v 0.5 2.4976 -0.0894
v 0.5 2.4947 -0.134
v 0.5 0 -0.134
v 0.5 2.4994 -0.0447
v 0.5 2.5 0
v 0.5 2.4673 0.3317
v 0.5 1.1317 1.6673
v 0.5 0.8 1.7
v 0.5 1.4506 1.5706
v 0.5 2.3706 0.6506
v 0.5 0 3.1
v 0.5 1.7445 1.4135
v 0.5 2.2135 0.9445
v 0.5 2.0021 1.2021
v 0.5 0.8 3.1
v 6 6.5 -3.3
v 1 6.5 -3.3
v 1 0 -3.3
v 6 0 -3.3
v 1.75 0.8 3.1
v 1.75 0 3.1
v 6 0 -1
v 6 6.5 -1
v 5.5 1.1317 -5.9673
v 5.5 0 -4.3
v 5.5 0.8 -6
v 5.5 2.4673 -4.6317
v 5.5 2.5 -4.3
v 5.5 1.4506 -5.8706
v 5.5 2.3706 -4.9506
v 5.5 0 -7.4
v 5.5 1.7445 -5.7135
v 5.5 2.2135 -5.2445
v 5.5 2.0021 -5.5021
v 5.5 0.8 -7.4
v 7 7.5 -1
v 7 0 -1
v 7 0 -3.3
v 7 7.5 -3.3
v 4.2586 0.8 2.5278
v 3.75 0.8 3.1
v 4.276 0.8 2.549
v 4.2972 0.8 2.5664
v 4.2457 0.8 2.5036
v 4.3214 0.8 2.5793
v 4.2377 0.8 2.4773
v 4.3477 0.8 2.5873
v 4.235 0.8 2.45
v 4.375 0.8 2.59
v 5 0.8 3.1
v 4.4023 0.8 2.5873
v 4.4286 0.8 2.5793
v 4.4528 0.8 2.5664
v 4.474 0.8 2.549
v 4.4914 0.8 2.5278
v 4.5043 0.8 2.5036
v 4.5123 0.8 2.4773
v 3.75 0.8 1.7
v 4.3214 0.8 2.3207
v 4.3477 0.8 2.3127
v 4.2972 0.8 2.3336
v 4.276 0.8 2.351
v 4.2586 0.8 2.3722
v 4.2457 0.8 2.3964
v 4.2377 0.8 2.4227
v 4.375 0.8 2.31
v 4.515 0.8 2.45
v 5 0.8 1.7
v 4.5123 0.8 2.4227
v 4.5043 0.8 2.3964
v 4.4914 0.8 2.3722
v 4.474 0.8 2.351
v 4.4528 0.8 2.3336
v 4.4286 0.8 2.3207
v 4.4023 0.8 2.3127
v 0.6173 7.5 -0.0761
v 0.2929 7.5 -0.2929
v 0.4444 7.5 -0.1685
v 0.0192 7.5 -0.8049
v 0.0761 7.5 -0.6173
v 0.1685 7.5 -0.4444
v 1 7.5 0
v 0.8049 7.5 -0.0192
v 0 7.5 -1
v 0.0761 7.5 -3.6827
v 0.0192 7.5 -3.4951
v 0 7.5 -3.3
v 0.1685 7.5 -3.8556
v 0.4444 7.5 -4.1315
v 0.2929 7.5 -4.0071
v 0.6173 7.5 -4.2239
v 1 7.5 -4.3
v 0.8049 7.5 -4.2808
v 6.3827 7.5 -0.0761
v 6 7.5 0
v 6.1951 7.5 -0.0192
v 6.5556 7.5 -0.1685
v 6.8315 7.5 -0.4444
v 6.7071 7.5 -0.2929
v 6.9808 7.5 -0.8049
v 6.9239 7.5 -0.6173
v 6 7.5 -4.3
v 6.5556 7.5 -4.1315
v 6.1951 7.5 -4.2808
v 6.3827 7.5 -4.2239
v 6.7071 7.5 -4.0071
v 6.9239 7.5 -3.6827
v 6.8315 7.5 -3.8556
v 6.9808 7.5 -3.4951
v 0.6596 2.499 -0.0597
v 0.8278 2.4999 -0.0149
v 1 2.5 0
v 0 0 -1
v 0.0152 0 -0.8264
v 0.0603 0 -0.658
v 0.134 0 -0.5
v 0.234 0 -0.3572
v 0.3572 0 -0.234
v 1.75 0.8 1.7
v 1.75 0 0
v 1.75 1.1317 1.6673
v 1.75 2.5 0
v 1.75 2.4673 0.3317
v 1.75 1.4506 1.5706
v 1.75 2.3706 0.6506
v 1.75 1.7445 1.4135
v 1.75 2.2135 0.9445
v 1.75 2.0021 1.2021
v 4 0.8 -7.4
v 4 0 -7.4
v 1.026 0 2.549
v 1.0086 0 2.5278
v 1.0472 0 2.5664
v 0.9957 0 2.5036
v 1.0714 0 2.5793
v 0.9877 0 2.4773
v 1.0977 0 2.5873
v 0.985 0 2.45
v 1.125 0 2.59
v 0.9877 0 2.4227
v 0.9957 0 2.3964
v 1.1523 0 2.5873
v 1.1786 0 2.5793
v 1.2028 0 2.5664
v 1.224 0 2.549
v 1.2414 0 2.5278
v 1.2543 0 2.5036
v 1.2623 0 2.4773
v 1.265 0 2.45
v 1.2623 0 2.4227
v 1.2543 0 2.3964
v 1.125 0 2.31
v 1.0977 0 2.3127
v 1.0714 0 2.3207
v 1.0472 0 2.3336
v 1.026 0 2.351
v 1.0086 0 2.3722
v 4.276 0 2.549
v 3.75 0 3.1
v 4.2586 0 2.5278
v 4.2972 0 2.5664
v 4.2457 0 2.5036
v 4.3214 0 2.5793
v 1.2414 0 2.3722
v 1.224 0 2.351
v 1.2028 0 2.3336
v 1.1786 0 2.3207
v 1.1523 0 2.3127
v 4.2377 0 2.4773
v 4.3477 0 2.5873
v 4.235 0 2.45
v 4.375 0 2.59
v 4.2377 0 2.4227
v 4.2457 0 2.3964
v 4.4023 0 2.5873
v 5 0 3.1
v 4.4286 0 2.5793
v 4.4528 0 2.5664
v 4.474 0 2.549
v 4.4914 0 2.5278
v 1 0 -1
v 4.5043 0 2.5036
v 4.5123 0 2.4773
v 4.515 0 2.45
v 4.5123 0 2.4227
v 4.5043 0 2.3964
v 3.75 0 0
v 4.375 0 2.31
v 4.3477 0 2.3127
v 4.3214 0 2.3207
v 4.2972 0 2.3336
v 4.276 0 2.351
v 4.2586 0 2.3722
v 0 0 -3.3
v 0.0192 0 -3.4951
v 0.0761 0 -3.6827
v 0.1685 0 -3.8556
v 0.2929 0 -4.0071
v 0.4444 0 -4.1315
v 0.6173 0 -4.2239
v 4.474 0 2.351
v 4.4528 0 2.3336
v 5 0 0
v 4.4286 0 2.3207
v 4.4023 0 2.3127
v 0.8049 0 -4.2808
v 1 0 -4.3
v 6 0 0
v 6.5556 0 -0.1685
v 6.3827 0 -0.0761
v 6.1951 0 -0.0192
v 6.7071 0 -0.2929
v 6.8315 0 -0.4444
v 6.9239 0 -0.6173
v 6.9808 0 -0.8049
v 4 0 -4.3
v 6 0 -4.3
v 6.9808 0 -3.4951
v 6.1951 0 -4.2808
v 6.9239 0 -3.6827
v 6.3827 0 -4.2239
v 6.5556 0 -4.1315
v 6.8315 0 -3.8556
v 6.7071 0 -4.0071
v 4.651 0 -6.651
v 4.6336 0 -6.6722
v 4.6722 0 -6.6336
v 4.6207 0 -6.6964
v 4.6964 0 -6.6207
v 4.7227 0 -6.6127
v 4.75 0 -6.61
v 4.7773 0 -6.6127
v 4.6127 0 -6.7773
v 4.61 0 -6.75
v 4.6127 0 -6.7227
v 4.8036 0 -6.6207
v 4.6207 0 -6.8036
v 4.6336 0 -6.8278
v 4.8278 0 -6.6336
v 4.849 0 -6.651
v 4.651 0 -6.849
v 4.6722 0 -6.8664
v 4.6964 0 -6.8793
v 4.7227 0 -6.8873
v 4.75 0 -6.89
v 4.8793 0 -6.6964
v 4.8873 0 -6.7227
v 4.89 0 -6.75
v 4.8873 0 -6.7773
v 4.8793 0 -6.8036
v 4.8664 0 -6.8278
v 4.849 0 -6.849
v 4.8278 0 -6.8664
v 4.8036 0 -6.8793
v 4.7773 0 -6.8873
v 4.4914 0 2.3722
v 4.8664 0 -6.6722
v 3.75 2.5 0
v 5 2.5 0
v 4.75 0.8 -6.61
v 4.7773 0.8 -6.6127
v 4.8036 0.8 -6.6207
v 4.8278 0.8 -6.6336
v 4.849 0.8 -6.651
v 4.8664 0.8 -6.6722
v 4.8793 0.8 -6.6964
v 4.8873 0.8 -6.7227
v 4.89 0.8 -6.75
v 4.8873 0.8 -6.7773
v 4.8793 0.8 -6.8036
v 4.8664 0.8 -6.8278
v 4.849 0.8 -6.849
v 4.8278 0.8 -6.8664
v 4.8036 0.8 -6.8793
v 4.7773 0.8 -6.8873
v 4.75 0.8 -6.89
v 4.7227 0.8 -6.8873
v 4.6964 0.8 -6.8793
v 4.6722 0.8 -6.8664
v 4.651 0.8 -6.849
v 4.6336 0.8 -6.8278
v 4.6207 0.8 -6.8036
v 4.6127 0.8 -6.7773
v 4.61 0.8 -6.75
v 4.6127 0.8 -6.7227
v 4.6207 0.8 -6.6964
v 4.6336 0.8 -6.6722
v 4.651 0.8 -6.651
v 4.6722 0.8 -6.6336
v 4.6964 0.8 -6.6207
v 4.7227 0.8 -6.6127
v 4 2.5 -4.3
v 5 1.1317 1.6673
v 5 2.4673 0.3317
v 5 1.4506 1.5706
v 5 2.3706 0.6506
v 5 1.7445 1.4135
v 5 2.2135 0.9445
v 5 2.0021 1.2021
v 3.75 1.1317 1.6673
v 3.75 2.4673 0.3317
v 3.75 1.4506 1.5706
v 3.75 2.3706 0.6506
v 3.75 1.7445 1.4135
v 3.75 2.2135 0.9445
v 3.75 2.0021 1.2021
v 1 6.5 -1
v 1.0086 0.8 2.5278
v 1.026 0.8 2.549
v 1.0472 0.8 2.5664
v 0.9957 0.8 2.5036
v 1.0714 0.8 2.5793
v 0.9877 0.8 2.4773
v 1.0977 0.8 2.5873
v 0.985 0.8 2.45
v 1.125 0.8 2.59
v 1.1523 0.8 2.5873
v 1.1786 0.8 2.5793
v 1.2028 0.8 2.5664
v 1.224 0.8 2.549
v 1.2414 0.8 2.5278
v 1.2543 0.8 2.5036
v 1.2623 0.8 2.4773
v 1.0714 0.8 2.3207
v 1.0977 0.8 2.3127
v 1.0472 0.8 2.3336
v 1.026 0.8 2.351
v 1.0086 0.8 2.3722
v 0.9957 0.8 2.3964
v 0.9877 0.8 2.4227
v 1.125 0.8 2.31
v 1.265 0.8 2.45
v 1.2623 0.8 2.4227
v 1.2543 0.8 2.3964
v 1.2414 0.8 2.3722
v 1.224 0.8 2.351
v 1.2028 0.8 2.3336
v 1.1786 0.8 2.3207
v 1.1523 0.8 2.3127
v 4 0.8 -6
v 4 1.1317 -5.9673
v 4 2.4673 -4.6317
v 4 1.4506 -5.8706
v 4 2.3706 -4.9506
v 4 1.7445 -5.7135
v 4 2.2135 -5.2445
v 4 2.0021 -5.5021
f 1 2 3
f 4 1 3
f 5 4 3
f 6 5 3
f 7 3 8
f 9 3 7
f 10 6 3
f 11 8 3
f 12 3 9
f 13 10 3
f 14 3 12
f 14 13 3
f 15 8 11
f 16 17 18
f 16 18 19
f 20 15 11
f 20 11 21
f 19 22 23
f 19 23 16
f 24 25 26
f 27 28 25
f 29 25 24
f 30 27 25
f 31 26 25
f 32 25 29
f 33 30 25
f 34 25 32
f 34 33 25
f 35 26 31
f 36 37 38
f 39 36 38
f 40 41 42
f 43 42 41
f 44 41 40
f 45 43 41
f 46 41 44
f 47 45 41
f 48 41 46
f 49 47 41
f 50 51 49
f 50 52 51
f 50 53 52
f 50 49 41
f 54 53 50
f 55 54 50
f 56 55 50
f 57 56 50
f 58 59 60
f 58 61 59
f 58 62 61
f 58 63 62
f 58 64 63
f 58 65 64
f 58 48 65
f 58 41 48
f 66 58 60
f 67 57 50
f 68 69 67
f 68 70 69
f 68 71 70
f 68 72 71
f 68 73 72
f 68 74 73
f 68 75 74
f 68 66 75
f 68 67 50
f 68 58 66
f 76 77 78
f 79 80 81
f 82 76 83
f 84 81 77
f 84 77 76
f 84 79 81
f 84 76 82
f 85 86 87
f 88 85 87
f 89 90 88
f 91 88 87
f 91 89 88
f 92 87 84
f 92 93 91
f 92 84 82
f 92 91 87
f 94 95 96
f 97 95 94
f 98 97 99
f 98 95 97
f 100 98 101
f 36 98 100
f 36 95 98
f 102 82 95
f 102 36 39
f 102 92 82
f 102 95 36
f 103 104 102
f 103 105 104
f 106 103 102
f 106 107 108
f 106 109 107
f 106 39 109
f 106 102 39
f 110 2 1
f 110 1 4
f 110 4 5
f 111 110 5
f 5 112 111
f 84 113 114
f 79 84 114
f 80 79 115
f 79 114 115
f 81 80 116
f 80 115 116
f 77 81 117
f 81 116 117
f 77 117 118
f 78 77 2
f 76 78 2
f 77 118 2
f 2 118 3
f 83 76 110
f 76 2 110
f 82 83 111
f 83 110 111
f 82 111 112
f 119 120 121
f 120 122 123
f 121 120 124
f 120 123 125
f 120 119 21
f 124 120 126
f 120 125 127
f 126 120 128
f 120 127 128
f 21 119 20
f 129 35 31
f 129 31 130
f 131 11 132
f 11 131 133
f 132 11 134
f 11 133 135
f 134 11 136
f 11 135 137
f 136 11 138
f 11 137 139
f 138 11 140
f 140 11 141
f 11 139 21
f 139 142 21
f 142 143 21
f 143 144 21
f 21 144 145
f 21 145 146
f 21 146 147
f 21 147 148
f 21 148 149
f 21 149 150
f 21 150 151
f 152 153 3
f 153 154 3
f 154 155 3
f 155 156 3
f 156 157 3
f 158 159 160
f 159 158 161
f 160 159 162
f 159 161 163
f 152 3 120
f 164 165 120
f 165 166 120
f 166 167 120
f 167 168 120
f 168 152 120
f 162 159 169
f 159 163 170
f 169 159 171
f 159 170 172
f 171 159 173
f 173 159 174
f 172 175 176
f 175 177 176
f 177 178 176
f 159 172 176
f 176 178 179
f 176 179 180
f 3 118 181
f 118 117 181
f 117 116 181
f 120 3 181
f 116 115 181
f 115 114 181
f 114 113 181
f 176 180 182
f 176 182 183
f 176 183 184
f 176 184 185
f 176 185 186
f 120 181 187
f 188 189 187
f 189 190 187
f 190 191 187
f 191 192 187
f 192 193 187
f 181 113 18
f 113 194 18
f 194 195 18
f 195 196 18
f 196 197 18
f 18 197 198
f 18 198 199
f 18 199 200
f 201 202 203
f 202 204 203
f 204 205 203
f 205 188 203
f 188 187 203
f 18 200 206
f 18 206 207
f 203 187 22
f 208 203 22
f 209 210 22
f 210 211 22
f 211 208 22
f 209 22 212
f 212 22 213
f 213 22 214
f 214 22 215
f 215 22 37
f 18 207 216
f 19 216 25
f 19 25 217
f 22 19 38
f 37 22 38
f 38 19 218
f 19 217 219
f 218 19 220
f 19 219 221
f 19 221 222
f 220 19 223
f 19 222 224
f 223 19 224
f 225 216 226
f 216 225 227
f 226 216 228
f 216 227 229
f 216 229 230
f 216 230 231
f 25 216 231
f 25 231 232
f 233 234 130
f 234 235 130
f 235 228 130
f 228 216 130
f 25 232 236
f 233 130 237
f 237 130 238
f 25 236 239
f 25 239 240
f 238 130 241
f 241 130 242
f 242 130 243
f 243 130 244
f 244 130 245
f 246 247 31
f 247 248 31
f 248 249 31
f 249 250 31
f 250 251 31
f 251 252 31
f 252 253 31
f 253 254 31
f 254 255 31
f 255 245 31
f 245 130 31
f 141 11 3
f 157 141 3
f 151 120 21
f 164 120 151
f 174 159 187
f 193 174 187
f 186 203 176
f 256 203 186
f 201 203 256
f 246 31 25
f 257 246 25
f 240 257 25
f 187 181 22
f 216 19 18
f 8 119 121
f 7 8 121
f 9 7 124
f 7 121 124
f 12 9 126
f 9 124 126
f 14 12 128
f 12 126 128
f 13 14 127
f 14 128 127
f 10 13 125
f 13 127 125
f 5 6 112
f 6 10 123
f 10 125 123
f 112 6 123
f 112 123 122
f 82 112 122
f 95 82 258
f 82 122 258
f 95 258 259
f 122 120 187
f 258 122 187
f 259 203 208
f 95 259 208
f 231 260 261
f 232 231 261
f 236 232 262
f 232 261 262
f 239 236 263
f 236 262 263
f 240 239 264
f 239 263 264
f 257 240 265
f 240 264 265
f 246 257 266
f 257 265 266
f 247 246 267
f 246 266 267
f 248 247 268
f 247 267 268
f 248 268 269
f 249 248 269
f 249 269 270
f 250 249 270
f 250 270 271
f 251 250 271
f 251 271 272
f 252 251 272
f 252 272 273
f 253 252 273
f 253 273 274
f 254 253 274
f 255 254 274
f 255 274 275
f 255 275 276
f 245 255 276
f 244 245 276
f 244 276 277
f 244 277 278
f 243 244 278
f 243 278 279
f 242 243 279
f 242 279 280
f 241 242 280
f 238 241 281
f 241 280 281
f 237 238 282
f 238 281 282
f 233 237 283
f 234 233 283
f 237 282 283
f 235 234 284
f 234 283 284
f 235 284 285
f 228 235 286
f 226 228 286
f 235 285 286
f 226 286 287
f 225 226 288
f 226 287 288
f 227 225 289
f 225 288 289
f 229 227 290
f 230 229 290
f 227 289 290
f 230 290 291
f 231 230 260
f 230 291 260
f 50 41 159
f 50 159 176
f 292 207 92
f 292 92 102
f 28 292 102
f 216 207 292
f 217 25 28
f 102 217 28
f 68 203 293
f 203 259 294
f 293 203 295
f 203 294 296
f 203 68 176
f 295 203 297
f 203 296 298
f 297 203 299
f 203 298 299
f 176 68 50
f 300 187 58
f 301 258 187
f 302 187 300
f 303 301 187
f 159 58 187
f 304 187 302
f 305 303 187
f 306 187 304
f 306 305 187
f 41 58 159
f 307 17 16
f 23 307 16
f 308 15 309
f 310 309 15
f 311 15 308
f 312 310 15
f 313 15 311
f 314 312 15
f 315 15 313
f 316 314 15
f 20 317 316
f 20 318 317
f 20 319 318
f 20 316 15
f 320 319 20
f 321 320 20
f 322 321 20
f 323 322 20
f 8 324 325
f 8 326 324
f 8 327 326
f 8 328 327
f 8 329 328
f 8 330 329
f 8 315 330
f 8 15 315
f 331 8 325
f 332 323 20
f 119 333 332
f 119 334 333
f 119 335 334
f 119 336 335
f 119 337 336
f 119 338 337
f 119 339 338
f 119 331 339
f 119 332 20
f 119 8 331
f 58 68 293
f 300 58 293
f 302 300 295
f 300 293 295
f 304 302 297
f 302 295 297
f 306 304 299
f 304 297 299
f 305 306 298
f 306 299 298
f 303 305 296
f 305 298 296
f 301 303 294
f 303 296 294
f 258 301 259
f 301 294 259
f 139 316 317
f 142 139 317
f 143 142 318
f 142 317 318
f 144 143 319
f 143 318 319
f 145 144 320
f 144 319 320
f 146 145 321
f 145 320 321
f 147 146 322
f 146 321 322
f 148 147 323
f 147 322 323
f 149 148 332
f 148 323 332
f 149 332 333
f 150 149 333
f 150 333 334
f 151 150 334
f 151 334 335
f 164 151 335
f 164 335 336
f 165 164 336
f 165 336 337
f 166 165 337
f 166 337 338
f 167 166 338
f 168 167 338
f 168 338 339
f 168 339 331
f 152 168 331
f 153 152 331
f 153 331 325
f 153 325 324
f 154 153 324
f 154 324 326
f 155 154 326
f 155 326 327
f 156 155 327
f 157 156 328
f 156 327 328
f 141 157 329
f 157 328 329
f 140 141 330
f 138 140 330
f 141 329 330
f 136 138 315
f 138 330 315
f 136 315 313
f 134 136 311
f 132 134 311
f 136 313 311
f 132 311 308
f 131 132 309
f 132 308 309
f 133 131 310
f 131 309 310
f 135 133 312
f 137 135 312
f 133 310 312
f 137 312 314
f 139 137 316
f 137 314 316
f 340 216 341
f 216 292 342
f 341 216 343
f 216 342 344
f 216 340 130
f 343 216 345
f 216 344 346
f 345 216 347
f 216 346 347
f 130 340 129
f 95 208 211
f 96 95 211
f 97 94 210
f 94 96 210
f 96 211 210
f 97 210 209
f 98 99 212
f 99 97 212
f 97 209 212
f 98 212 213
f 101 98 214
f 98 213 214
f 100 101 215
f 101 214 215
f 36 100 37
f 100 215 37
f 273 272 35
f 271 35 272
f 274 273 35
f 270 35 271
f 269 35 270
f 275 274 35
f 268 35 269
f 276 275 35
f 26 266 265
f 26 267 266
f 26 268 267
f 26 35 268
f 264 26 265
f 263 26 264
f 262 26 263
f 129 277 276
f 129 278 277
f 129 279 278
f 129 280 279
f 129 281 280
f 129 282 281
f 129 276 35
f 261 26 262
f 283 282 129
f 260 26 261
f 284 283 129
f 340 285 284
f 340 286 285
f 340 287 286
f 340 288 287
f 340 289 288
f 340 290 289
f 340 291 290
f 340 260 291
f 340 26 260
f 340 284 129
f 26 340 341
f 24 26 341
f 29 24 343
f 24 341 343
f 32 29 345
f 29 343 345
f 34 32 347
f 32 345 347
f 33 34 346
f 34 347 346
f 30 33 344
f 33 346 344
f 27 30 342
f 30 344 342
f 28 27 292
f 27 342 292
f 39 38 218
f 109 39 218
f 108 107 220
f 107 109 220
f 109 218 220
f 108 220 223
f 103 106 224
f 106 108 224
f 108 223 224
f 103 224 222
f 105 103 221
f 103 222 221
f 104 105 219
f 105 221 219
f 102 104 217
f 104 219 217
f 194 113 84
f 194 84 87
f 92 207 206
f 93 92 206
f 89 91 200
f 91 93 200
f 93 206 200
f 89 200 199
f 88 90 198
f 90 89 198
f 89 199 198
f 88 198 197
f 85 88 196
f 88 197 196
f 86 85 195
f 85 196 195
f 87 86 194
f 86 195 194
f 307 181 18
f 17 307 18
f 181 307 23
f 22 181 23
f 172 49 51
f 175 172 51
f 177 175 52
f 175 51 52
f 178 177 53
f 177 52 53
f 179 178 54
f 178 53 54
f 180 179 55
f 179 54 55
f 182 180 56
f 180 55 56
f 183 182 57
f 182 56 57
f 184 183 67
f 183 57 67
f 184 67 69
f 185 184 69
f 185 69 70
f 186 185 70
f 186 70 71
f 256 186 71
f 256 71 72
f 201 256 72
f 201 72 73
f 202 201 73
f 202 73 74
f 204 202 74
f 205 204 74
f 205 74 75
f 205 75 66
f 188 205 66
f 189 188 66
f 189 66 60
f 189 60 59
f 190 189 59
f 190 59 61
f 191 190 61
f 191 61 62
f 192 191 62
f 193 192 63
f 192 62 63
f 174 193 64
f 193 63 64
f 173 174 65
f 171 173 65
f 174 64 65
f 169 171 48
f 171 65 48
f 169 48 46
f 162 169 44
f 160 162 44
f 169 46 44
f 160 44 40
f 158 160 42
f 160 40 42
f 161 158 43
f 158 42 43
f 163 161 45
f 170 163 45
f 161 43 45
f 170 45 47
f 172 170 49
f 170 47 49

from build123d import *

# Parameters (mm, degrees)
ESQUISSE1_W             = 7
ESQUISSE1_H             = 4.3
BOSS_EXTRU_1_DEPTH      = 7.5
COQUE1_T                = -1
ESQUISSE2_W             = 1.25
ESQUISSE2_H             = 0.8
BOSS_EXTRU_2_DEPTH      = 3.1
ESQUISSE3_W             = 1.5
ESQUISSE3_H             = 0.8
BOSS_EXTRU_3_DEPTH      = 3.1
ESQUISSE4_R             = 0.14
ENL_V_MAT_EXTRU_1_DEPTH = 13.192210628
BOSS_EXTRU_4_DEPTH      = 1.25
BOSS_EXTRU_5_START      = -1.25
BOSS_EXTRU_5_DEPTH      = 1.25
BOSS_EXTRU_6_DEPTH      = 1.5
CONG_1_R                = 1


with BuildPart() as part:
    # Esquisse1 → Boss.-Extru.1 (new body)
    with BuildSketch(Plane(origin=(0, 0, 0), x_dir=(1, 0, 0), z_dir=(0, 1, 0))):
        with Locations((3.5, 2.15)):
            Rectangle(ESQUISSE1_W, ESQUISSE1_H)
    extrude(amount=BOSS_EXTRU_1_DEPTH)

    # Coque1
    coque1_openings = [part.faces().sort_by_distance(p)[0] for p in [
        (3.5, 0, -2.15),
    ]]
    offset(amount=COQUE1_T, openings=coque1_openings, kind=Kind.INTERSECTION)

    # Esquisse2 → Boss.-Extru.2 (add)
    with BuildSketch(Plane.XY):
        with Locations((1.125, 0.4)):
            Rectangle(ESQUISSE2_W, ESQUISSE2_H)
        with Locations((4.375, 0.4)):
            Rectangle(ESQUISSE2_W, ESQUISSE2_H)
    extrude(amount=BOSS_EXTRU_2_DEPTH)

    # Esquisse3 → Boss.-Extru.3 (add)
    with BuildSketch(Plane(origin=(0, 0, -4.3), x_dir=(-1, 0, 0), z_dir=(0, 0, -1))):
        with Locations((-4.75, 0.4)):
            Rectangle(ESQUISSE3_W, ESQUISSE3_H)
    extrude(amount=BOSS_EXTRU_3_DEPTH)

    # Esquisse4 → Enlèv. mat.-Extru.1 (cut, through all)
    with BuildSketch(Plane(origin=(0, 0.8, 0), x_dir=(1, 0, 0), z_dir=(0, 1, 0))):
        with Locations(Location((4.75, 6.75, 0), (0, 0, 270))):
            Circle(ESQUISSE4_R)
        with Locations(Location((1.125, -2.45, 0), (0, 0, 270))):
            Circle(ESQUISSE4_R)
        with Locations(Location((4.375, -2.45, 0), (0, 0, 270))):
            Circle(ESQUISSE4_R)
    extrude(amount=-ENL_V_MAT_EXTRU_1_DEPTH, mode=Mode.SUBTRACT)

    # Esquisse5 → Boss.-Extru.4 (add)
    with BuildSketch(Plane(origin=(5, 0, 0), x_dir=(0, 0, -1), z_dir=(1, 0, 0))):
        with BuildLine():
            Line((0, 2.5), (0, 0.8))
            Line((0, 0.8), (-1.7, 0.8))
            ThreePointArc((-1.7, 0.8), (-1.202081528, 2.002081528), (0, 2.5))
        make_face()
    extrude(amount=-BOSS_EXTRU_4_DEPTH)

    # Esquisse6 → Boss.-Extru.5 (add)
    with BuildSketch(Plane.ZY.offset(-0.5).offset(BOSS_EXTRU_5_START)):
        with BuildLine():
            Line((0, 2.5), (0, 0.8))
            Line((0, 0.8), (1.7, 0.8))
            ThreePointArc((1.7, 0.8), (1.202081528, 2.002081528), (0, 2.5))
        make_face()
    extrude(amount=BOSS_EXTRU_5_DEPTH)

    # Esquisse7 → Boss.-Extru.6 (add)
    with BuildSketch(Plane.ZY.offset(-4)):
        with BuildLine():
            Line((-4.3, 2.5), (-4.3, 0.8))
            Line((-4.3, 0.8), (-6, 0.8))
            ThreePointArc((-6, 0.8), (-5.502081528, 2.002081528), (-4.3, 2.5))
        make_face()
    extrude(amount=-BOSS_EXTRU_6_DEPTH)

    # Congé1
    # the kernel refuses this fillet: 1 mm, written as the material it takes off along each edge
    with BuildSketch(Plane(origin=(0, -2.5, 0), x_dir=(1, 0, 0), z_dir=(0, 1, 0))) as cong_1_piece_1_section:
        with BuildLine():
            CenterArc((CONG_1_R, CONG_1_R), CONG_1_R, 180, 90)
            Line((0, CONG_1_R), (0, 0))
            Line((0, 0), (CONG_1_R, 0))
        make_face()
    cong_1_piece_1 = extrude(amount=12.5, mode=Mode.PRIVATE)
    cong_1_piece_1 = split(cong_1_piece_1, bisect_by=Plane(origin=(0.5, 1.236097217, -0.241175313), z_dir=(-1, 0, 0)), keep=Keep.TOP, mode=Mode.PRIVATE)
    add(cong_1_piece_1, mode=Mode.SUBTRACT)
    with BuildSketch(Plane(origin=(0, -2.5, 0), x_dir=(1, 0, 0), z_dir=(0, 1, 0))) as cong_1_piece_2_section:
        with BuildLine():
            CenterArc((CONG_1_R, CONG_1_R), CONG_1_R, 180, 90)
            Line((0, CONG_1_R), (0, 0))
            Line((0, 0), (CONG_1_R, 0))
        make_face()
    cong_1_piece_2 = extrude(amount=12.5, mode=Mode.PRIVATE)
    cong_1_piece_2 = cong_1_piece_2 - Plane(origin=(0.623254318, 0.8, 0), x_dir=(0, 0, 1), z_dir=(1, 0, 0)) * Cylinder(1.7, 29, mode=Mode.PRIVATE)
    add(cong_1_piece_2, mode=Mode.SUBTRACT)
    with BuildSketch(Plane(origin=(0, -2.5, -4.3), x_dir=(1, 0, 0), z_dir=(0, 1, 0)), Plane(origin=(7, -2.5, -4.3), x_dir=(0, 0, 1), z_dir=(0, 1, 0)), Plane(origin=(7, -2.5, 0), x_dir=(-1, 0, 0), z_dir=(0, 1, 0))) as cong_1_piece_3:
        with BuildLine():
            CenterArc((CONG_1_R, -CONG_1_R), CONG_1_R, 90, 90)
            Line((0, -CONG_1_R), (0, 0))
            Line((0, 0), (CONG_1_R, 0))
        make_face()
    extrude(amount=12.5, mode=Mode.SUBTRACT)


solid = part.part
